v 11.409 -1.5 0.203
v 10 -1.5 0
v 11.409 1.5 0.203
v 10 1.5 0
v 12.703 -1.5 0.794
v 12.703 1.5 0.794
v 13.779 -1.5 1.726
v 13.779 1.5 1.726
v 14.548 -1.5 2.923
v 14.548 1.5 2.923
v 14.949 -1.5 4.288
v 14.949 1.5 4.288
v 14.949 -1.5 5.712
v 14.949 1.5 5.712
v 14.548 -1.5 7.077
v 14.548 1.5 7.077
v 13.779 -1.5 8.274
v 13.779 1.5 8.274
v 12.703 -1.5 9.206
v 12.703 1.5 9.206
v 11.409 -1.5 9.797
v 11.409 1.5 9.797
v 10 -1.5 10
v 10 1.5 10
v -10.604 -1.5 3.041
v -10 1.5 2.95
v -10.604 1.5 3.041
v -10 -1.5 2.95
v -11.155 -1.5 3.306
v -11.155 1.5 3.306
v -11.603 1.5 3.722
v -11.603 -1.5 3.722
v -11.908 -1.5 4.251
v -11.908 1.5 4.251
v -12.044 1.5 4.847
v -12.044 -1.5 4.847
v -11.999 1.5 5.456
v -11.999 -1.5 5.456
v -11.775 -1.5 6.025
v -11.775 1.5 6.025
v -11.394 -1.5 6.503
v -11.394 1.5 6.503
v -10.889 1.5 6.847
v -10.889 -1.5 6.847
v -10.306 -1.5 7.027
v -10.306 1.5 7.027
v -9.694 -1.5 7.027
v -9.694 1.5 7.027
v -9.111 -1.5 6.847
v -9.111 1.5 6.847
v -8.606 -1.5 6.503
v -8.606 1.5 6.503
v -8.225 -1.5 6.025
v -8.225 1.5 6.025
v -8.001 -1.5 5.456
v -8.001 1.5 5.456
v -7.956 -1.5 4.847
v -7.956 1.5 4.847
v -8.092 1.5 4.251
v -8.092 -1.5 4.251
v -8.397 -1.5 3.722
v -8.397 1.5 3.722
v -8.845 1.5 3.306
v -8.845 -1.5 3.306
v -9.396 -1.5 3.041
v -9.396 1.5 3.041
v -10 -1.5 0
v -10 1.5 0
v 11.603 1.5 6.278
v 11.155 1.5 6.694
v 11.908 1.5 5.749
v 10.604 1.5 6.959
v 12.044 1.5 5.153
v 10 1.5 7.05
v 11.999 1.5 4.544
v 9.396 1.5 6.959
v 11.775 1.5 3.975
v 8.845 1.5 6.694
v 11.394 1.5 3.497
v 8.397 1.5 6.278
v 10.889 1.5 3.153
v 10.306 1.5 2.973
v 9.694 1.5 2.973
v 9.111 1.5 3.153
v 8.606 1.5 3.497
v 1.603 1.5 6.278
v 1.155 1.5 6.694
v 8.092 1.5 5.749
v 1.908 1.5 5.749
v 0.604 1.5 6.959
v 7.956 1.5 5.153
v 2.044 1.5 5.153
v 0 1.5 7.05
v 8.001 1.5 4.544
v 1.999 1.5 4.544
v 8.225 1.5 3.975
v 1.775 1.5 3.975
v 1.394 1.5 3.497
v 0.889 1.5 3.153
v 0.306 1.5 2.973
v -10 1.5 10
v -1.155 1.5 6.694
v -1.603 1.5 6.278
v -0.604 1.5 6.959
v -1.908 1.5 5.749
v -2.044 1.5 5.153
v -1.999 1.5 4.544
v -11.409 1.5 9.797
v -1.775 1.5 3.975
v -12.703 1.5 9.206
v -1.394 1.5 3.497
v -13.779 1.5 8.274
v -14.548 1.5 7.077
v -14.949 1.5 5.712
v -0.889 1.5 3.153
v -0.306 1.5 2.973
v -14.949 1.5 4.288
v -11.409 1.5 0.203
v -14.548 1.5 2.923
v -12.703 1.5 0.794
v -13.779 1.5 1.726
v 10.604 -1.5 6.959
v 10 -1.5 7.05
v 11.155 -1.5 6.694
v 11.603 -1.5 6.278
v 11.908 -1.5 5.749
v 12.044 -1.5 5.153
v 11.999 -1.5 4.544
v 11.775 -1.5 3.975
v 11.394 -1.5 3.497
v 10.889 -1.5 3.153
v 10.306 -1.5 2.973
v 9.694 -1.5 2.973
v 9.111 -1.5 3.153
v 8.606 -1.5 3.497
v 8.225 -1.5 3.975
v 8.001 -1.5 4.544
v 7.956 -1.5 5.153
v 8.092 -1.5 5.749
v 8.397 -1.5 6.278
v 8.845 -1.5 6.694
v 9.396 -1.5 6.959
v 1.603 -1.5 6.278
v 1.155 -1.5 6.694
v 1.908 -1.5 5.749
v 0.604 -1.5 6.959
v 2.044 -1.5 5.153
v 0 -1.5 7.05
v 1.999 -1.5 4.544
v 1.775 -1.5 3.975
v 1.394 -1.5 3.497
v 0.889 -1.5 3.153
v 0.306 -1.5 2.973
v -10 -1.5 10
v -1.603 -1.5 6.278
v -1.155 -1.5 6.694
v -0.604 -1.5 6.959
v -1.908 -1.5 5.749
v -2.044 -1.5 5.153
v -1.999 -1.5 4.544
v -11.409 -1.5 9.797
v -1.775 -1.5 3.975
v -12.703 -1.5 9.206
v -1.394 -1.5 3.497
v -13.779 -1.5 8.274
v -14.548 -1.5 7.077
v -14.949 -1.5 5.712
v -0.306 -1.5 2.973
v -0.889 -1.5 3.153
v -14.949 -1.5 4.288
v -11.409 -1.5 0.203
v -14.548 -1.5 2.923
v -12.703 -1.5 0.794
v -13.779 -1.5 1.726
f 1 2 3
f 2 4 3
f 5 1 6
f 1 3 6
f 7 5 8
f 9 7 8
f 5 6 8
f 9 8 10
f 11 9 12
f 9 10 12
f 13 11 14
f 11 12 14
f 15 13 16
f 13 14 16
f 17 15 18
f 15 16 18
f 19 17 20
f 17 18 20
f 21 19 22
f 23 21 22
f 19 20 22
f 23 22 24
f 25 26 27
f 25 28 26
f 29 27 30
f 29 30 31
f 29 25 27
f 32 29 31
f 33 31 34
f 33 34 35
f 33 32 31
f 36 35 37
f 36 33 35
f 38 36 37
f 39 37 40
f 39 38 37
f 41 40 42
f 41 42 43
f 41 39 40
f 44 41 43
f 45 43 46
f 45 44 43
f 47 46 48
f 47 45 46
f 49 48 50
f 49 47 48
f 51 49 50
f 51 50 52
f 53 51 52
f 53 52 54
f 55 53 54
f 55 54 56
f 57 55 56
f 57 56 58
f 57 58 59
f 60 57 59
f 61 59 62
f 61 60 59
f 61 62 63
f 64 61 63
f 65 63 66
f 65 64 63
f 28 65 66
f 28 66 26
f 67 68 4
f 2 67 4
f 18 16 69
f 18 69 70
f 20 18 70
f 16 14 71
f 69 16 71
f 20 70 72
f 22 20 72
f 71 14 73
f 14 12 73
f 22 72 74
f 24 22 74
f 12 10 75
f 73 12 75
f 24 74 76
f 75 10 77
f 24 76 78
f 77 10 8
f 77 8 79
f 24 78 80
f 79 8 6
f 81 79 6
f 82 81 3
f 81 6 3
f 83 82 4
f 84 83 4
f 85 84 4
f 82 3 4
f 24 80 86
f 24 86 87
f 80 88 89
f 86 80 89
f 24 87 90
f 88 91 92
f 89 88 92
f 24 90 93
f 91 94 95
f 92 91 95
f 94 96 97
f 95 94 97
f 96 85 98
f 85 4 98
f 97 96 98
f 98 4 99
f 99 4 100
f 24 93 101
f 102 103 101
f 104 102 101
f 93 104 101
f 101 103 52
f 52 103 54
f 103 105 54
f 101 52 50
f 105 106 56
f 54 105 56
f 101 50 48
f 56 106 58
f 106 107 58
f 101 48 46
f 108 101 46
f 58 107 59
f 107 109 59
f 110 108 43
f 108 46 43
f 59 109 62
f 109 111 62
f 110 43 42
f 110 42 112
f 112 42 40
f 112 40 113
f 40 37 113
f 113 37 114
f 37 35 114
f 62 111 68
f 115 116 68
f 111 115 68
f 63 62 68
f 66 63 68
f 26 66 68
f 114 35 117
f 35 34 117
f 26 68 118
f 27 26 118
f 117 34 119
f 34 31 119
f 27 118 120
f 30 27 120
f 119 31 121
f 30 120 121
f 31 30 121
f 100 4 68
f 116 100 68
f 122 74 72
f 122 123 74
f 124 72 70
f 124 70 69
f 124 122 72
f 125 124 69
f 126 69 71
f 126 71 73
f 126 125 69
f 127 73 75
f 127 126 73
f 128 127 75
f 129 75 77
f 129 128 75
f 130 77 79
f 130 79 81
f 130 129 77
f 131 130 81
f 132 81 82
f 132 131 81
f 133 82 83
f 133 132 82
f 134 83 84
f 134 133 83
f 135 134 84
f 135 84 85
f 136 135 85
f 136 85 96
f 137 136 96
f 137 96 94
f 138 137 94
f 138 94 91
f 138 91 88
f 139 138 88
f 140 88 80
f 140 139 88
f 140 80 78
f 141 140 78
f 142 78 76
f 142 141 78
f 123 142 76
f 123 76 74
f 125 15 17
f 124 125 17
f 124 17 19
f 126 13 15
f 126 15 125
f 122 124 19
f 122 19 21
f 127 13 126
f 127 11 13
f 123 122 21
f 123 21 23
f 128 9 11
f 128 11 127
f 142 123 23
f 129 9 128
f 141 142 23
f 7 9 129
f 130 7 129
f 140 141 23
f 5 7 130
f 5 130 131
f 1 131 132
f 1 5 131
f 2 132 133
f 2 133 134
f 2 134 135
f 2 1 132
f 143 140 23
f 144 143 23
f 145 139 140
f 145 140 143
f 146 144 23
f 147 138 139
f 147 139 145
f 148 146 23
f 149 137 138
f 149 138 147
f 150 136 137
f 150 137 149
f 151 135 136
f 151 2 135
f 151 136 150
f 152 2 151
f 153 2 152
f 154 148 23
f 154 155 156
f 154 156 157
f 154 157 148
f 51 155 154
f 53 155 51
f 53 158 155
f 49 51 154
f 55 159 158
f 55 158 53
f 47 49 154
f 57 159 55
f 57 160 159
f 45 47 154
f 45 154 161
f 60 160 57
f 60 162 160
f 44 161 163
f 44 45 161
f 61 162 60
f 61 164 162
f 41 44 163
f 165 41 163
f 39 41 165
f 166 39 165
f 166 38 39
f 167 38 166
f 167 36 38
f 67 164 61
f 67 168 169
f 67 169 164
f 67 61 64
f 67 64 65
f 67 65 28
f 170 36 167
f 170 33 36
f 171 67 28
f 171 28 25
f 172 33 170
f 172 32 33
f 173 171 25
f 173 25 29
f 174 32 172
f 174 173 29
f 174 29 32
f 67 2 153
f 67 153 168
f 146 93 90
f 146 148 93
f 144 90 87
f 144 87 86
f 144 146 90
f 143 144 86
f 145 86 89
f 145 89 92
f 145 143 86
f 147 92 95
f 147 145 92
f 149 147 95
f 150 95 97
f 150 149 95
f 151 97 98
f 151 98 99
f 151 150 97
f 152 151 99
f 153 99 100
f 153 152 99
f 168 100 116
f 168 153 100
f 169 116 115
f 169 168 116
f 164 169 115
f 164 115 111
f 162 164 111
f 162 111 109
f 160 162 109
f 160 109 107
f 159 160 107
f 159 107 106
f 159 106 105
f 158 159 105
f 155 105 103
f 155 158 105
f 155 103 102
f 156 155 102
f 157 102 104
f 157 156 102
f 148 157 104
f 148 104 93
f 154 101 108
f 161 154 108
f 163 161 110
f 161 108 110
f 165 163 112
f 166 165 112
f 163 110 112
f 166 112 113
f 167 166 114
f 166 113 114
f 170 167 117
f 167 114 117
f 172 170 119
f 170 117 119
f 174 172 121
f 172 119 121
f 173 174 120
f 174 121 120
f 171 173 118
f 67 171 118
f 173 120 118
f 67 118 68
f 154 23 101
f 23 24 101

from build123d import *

# Parameters (mm, degrees)
SKETCH1_R           = 2.05
BOSS_EXTRUDE1_DEPTH = 1.5


with BuildPart() as part:
    # Sketch1 → Boss-Extrude1 (new, symmetric)
    with BuildSketch(Plane(origin=(0, 0, 0), x_dir=(1, 0, 0), z_dir=(0, 1, 0))):
        with BuildLine():
            Line((-10, 0), (-5, 0))
            Line((-5, 0), (5, 0))
            Line((5, 0), (10, 0))
            ThreePointArc((10, 0), (15, -5), (10, -10))
            Line((10, -10), (5, -10))
            Line((5, -10), (-5, -10))
            Line((-5, -10), (-10, -10))
            ThreePointArc((-10, -10), (-15, -5), (-10, 0))
        make_face()
        with Locations(Location((10, -5, 0), (0, 0, 270))):
            Circle(SKETCH1_R, mode=Mode.SUBTRACT)
        with Locations(Location((-10, -5, 0), (0, 0, 90))):
            Circle(SKETCH1_R, mode=Mode.SUBTRACT)
        with Locations(Location((0, -5, 0), (0, 0, 270))):
            Circle(SKETCH1_R, mode=Mode.SUBTRACT)
    extrude(amount=BOSS_EXTRUDE1_DEPTH, both=True)


solid = part.part
